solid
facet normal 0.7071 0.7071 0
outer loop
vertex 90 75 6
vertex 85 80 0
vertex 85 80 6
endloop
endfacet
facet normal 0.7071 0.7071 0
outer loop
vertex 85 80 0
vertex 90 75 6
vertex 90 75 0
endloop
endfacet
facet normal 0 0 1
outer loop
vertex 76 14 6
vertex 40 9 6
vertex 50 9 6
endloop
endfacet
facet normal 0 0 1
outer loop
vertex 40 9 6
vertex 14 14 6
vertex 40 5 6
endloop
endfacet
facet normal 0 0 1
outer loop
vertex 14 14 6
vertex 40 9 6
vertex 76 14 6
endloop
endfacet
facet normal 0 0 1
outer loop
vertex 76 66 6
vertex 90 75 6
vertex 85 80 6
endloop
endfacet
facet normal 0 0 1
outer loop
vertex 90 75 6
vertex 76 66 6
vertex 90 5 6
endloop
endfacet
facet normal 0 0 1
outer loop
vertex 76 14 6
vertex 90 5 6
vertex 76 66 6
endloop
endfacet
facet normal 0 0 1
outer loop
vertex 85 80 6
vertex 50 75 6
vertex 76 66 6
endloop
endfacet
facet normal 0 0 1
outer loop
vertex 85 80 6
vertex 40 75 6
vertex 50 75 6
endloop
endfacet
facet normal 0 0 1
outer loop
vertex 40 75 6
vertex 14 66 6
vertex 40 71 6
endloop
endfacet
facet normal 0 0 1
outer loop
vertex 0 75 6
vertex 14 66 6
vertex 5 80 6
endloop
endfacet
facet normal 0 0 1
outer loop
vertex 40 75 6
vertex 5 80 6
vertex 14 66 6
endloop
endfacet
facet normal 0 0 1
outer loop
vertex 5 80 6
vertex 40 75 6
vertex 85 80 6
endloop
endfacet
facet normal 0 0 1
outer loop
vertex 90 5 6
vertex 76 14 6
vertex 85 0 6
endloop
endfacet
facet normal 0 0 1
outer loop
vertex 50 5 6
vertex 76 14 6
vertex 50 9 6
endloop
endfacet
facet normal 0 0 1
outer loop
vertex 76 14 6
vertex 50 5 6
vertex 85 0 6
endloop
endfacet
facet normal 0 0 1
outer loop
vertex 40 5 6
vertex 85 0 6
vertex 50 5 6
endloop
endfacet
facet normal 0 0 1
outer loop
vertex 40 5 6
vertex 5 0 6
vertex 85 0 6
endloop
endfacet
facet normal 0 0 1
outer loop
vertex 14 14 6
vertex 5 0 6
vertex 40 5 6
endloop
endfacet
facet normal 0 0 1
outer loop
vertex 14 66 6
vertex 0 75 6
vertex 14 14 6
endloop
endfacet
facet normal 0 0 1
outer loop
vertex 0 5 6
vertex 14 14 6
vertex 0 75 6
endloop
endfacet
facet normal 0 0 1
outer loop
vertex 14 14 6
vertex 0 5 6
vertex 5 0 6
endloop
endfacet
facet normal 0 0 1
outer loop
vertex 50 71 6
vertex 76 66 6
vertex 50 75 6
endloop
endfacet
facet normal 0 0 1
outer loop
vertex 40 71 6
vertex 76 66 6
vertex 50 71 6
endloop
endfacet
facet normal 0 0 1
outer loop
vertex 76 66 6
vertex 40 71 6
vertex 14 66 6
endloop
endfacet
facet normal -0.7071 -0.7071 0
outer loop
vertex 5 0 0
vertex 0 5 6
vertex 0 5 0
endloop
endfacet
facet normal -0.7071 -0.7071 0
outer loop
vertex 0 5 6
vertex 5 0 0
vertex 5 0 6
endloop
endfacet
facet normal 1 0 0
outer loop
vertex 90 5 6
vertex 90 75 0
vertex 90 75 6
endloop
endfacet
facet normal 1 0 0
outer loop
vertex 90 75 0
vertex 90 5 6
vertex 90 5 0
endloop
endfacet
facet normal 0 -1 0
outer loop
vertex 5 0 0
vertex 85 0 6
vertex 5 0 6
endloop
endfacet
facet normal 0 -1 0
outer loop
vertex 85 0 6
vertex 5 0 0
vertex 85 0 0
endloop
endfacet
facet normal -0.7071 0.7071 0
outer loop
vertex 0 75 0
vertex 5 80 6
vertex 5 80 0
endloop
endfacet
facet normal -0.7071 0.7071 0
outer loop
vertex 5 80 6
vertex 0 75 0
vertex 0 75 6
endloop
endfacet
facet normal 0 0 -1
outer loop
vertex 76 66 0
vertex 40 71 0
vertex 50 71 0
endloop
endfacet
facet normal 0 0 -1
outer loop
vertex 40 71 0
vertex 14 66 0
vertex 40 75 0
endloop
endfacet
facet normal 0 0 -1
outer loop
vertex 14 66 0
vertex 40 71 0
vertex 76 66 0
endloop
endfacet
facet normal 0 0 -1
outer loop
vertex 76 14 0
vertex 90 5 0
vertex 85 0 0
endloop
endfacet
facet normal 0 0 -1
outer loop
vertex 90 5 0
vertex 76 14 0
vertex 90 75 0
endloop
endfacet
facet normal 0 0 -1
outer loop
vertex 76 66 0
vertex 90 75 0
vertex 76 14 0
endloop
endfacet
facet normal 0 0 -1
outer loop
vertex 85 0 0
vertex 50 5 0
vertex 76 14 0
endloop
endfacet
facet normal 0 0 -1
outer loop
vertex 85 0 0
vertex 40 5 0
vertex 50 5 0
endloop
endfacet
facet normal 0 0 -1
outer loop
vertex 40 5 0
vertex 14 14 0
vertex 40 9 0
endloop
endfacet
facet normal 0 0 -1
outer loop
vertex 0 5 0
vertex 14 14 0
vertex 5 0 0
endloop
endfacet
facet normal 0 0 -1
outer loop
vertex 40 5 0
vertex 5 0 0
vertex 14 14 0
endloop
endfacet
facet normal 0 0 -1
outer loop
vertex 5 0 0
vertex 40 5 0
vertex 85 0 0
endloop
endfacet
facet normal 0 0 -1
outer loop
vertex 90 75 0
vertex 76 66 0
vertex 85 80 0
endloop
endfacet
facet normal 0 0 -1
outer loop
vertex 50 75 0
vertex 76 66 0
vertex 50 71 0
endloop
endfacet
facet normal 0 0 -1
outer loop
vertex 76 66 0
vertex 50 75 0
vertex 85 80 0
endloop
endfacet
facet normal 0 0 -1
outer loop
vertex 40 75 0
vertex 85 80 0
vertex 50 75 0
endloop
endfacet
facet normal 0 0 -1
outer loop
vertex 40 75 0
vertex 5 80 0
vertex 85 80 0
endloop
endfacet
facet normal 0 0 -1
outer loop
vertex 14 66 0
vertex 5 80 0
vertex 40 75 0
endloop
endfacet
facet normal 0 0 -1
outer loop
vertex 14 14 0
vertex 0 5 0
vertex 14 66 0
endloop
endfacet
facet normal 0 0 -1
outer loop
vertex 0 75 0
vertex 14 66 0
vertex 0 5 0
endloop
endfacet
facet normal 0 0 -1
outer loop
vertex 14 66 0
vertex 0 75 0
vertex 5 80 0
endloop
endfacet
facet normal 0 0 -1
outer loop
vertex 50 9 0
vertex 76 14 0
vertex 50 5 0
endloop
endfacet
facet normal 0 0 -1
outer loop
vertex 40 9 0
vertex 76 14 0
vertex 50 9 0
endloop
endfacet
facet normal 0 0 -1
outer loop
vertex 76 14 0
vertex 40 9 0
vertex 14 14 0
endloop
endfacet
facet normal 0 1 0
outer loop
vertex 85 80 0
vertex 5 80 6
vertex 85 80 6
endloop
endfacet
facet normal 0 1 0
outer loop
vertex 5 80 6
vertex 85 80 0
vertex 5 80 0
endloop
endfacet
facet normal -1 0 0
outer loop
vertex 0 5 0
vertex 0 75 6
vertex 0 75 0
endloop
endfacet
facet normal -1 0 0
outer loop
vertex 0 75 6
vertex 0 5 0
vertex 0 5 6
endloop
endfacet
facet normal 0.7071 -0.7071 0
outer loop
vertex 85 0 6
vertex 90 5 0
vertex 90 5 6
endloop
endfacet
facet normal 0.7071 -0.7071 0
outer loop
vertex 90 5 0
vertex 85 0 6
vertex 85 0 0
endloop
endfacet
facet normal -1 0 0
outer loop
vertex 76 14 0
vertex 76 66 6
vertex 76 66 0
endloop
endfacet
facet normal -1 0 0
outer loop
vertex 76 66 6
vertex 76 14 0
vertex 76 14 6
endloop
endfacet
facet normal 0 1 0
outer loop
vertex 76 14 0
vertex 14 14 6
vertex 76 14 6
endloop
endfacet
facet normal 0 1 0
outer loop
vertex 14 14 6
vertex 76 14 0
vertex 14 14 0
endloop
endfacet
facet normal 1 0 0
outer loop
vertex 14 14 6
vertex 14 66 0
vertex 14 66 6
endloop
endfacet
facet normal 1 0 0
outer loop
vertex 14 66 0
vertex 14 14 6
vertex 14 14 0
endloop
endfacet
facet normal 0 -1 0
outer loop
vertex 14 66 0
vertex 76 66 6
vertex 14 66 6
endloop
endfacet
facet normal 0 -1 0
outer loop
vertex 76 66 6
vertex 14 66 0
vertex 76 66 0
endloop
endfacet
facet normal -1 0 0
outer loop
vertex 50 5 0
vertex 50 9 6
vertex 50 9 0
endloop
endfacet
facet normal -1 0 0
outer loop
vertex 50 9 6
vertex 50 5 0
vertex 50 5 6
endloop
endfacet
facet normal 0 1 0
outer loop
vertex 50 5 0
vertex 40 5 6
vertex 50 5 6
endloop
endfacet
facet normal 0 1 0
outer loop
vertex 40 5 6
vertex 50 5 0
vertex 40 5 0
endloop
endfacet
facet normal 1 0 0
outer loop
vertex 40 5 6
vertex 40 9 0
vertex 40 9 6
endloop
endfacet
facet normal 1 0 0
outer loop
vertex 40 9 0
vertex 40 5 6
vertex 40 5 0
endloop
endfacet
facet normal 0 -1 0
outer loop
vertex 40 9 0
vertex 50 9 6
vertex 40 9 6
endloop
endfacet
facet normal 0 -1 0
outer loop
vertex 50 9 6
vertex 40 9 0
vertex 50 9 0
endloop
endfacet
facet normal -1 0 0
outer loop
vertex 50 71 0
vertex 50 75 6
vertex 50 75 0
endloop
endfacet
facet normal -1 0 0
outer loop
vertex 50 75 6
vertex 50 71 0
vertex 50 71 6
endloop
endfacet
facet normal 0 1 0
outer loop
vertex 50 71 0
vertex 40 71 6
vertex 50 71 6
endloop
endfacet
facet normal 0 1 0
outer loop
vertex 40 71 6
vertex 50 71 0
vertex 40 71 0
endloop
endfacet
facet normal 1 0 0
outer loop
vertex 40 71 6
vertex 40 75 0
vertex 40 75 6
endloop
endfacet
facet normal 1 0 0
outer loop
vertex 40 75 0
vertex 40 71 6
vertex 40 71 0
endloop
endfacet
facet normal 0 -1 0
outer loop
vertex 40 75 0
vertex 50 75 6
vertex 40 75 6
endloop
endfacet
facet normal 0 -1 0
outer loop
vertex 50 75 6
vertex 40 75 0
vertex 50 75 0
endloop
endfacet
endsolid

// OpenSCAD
$fn = 32;

// ----------------------------------------------------------------------
// Frame plate: 90 x 80 frame, 14 mm rails
// ----------------------------------------------------------------------

// --- parameters (mm) ---
plate_l = 90;             // plate length, X
plate_w = 80;             // plate width, Y
plate_t = 6;              // plate thickness, Z (extrusion height)
corner_c = 5;             // corner chamfer
frame_bar = 14;           // frame rail width
slot_l = 10;              // adjustment slot length
slot_w = 4;               // adjustment slot width

win_l = plate_l - 2 * frame_bar;  // window length
win_w = plate_w - 2 * frame_bar;  // window width

profile = [[5, 0], [85, 0], [90, 5], [90, 75], [85, 80], [5, 80], [0, 75], [0, 5]];  // primary outline, 8 points, counter clockwise
void_1 = [[14, 14], [76, 14], [76, 66], [14, 66]];  // the window, 4 points
void_2 = [[40, 5], [50, 5], [50, 9], [40, 9]];  // adjustment slot, 4 points
void_3 = [[40, 71], [50, 71], [50, 75], [40, 75]];  // adjustment slot, 4 points

// --- the one profile operation ---
difference() {
  linear_extrude(height = plate_t) polygon(points = profile);
  translate([0, 0, -1])
    linear_extrude(height = plate_t + 2) polygon(points = void_1);
  translate([0, 0, -1])
    linear_extrude(height = plate_t + 2) polygon(points = void_2);
  translate([0, 0, -1])
    linear_extrude(height = plate_t + 2) polygon(points = void_3);
}
